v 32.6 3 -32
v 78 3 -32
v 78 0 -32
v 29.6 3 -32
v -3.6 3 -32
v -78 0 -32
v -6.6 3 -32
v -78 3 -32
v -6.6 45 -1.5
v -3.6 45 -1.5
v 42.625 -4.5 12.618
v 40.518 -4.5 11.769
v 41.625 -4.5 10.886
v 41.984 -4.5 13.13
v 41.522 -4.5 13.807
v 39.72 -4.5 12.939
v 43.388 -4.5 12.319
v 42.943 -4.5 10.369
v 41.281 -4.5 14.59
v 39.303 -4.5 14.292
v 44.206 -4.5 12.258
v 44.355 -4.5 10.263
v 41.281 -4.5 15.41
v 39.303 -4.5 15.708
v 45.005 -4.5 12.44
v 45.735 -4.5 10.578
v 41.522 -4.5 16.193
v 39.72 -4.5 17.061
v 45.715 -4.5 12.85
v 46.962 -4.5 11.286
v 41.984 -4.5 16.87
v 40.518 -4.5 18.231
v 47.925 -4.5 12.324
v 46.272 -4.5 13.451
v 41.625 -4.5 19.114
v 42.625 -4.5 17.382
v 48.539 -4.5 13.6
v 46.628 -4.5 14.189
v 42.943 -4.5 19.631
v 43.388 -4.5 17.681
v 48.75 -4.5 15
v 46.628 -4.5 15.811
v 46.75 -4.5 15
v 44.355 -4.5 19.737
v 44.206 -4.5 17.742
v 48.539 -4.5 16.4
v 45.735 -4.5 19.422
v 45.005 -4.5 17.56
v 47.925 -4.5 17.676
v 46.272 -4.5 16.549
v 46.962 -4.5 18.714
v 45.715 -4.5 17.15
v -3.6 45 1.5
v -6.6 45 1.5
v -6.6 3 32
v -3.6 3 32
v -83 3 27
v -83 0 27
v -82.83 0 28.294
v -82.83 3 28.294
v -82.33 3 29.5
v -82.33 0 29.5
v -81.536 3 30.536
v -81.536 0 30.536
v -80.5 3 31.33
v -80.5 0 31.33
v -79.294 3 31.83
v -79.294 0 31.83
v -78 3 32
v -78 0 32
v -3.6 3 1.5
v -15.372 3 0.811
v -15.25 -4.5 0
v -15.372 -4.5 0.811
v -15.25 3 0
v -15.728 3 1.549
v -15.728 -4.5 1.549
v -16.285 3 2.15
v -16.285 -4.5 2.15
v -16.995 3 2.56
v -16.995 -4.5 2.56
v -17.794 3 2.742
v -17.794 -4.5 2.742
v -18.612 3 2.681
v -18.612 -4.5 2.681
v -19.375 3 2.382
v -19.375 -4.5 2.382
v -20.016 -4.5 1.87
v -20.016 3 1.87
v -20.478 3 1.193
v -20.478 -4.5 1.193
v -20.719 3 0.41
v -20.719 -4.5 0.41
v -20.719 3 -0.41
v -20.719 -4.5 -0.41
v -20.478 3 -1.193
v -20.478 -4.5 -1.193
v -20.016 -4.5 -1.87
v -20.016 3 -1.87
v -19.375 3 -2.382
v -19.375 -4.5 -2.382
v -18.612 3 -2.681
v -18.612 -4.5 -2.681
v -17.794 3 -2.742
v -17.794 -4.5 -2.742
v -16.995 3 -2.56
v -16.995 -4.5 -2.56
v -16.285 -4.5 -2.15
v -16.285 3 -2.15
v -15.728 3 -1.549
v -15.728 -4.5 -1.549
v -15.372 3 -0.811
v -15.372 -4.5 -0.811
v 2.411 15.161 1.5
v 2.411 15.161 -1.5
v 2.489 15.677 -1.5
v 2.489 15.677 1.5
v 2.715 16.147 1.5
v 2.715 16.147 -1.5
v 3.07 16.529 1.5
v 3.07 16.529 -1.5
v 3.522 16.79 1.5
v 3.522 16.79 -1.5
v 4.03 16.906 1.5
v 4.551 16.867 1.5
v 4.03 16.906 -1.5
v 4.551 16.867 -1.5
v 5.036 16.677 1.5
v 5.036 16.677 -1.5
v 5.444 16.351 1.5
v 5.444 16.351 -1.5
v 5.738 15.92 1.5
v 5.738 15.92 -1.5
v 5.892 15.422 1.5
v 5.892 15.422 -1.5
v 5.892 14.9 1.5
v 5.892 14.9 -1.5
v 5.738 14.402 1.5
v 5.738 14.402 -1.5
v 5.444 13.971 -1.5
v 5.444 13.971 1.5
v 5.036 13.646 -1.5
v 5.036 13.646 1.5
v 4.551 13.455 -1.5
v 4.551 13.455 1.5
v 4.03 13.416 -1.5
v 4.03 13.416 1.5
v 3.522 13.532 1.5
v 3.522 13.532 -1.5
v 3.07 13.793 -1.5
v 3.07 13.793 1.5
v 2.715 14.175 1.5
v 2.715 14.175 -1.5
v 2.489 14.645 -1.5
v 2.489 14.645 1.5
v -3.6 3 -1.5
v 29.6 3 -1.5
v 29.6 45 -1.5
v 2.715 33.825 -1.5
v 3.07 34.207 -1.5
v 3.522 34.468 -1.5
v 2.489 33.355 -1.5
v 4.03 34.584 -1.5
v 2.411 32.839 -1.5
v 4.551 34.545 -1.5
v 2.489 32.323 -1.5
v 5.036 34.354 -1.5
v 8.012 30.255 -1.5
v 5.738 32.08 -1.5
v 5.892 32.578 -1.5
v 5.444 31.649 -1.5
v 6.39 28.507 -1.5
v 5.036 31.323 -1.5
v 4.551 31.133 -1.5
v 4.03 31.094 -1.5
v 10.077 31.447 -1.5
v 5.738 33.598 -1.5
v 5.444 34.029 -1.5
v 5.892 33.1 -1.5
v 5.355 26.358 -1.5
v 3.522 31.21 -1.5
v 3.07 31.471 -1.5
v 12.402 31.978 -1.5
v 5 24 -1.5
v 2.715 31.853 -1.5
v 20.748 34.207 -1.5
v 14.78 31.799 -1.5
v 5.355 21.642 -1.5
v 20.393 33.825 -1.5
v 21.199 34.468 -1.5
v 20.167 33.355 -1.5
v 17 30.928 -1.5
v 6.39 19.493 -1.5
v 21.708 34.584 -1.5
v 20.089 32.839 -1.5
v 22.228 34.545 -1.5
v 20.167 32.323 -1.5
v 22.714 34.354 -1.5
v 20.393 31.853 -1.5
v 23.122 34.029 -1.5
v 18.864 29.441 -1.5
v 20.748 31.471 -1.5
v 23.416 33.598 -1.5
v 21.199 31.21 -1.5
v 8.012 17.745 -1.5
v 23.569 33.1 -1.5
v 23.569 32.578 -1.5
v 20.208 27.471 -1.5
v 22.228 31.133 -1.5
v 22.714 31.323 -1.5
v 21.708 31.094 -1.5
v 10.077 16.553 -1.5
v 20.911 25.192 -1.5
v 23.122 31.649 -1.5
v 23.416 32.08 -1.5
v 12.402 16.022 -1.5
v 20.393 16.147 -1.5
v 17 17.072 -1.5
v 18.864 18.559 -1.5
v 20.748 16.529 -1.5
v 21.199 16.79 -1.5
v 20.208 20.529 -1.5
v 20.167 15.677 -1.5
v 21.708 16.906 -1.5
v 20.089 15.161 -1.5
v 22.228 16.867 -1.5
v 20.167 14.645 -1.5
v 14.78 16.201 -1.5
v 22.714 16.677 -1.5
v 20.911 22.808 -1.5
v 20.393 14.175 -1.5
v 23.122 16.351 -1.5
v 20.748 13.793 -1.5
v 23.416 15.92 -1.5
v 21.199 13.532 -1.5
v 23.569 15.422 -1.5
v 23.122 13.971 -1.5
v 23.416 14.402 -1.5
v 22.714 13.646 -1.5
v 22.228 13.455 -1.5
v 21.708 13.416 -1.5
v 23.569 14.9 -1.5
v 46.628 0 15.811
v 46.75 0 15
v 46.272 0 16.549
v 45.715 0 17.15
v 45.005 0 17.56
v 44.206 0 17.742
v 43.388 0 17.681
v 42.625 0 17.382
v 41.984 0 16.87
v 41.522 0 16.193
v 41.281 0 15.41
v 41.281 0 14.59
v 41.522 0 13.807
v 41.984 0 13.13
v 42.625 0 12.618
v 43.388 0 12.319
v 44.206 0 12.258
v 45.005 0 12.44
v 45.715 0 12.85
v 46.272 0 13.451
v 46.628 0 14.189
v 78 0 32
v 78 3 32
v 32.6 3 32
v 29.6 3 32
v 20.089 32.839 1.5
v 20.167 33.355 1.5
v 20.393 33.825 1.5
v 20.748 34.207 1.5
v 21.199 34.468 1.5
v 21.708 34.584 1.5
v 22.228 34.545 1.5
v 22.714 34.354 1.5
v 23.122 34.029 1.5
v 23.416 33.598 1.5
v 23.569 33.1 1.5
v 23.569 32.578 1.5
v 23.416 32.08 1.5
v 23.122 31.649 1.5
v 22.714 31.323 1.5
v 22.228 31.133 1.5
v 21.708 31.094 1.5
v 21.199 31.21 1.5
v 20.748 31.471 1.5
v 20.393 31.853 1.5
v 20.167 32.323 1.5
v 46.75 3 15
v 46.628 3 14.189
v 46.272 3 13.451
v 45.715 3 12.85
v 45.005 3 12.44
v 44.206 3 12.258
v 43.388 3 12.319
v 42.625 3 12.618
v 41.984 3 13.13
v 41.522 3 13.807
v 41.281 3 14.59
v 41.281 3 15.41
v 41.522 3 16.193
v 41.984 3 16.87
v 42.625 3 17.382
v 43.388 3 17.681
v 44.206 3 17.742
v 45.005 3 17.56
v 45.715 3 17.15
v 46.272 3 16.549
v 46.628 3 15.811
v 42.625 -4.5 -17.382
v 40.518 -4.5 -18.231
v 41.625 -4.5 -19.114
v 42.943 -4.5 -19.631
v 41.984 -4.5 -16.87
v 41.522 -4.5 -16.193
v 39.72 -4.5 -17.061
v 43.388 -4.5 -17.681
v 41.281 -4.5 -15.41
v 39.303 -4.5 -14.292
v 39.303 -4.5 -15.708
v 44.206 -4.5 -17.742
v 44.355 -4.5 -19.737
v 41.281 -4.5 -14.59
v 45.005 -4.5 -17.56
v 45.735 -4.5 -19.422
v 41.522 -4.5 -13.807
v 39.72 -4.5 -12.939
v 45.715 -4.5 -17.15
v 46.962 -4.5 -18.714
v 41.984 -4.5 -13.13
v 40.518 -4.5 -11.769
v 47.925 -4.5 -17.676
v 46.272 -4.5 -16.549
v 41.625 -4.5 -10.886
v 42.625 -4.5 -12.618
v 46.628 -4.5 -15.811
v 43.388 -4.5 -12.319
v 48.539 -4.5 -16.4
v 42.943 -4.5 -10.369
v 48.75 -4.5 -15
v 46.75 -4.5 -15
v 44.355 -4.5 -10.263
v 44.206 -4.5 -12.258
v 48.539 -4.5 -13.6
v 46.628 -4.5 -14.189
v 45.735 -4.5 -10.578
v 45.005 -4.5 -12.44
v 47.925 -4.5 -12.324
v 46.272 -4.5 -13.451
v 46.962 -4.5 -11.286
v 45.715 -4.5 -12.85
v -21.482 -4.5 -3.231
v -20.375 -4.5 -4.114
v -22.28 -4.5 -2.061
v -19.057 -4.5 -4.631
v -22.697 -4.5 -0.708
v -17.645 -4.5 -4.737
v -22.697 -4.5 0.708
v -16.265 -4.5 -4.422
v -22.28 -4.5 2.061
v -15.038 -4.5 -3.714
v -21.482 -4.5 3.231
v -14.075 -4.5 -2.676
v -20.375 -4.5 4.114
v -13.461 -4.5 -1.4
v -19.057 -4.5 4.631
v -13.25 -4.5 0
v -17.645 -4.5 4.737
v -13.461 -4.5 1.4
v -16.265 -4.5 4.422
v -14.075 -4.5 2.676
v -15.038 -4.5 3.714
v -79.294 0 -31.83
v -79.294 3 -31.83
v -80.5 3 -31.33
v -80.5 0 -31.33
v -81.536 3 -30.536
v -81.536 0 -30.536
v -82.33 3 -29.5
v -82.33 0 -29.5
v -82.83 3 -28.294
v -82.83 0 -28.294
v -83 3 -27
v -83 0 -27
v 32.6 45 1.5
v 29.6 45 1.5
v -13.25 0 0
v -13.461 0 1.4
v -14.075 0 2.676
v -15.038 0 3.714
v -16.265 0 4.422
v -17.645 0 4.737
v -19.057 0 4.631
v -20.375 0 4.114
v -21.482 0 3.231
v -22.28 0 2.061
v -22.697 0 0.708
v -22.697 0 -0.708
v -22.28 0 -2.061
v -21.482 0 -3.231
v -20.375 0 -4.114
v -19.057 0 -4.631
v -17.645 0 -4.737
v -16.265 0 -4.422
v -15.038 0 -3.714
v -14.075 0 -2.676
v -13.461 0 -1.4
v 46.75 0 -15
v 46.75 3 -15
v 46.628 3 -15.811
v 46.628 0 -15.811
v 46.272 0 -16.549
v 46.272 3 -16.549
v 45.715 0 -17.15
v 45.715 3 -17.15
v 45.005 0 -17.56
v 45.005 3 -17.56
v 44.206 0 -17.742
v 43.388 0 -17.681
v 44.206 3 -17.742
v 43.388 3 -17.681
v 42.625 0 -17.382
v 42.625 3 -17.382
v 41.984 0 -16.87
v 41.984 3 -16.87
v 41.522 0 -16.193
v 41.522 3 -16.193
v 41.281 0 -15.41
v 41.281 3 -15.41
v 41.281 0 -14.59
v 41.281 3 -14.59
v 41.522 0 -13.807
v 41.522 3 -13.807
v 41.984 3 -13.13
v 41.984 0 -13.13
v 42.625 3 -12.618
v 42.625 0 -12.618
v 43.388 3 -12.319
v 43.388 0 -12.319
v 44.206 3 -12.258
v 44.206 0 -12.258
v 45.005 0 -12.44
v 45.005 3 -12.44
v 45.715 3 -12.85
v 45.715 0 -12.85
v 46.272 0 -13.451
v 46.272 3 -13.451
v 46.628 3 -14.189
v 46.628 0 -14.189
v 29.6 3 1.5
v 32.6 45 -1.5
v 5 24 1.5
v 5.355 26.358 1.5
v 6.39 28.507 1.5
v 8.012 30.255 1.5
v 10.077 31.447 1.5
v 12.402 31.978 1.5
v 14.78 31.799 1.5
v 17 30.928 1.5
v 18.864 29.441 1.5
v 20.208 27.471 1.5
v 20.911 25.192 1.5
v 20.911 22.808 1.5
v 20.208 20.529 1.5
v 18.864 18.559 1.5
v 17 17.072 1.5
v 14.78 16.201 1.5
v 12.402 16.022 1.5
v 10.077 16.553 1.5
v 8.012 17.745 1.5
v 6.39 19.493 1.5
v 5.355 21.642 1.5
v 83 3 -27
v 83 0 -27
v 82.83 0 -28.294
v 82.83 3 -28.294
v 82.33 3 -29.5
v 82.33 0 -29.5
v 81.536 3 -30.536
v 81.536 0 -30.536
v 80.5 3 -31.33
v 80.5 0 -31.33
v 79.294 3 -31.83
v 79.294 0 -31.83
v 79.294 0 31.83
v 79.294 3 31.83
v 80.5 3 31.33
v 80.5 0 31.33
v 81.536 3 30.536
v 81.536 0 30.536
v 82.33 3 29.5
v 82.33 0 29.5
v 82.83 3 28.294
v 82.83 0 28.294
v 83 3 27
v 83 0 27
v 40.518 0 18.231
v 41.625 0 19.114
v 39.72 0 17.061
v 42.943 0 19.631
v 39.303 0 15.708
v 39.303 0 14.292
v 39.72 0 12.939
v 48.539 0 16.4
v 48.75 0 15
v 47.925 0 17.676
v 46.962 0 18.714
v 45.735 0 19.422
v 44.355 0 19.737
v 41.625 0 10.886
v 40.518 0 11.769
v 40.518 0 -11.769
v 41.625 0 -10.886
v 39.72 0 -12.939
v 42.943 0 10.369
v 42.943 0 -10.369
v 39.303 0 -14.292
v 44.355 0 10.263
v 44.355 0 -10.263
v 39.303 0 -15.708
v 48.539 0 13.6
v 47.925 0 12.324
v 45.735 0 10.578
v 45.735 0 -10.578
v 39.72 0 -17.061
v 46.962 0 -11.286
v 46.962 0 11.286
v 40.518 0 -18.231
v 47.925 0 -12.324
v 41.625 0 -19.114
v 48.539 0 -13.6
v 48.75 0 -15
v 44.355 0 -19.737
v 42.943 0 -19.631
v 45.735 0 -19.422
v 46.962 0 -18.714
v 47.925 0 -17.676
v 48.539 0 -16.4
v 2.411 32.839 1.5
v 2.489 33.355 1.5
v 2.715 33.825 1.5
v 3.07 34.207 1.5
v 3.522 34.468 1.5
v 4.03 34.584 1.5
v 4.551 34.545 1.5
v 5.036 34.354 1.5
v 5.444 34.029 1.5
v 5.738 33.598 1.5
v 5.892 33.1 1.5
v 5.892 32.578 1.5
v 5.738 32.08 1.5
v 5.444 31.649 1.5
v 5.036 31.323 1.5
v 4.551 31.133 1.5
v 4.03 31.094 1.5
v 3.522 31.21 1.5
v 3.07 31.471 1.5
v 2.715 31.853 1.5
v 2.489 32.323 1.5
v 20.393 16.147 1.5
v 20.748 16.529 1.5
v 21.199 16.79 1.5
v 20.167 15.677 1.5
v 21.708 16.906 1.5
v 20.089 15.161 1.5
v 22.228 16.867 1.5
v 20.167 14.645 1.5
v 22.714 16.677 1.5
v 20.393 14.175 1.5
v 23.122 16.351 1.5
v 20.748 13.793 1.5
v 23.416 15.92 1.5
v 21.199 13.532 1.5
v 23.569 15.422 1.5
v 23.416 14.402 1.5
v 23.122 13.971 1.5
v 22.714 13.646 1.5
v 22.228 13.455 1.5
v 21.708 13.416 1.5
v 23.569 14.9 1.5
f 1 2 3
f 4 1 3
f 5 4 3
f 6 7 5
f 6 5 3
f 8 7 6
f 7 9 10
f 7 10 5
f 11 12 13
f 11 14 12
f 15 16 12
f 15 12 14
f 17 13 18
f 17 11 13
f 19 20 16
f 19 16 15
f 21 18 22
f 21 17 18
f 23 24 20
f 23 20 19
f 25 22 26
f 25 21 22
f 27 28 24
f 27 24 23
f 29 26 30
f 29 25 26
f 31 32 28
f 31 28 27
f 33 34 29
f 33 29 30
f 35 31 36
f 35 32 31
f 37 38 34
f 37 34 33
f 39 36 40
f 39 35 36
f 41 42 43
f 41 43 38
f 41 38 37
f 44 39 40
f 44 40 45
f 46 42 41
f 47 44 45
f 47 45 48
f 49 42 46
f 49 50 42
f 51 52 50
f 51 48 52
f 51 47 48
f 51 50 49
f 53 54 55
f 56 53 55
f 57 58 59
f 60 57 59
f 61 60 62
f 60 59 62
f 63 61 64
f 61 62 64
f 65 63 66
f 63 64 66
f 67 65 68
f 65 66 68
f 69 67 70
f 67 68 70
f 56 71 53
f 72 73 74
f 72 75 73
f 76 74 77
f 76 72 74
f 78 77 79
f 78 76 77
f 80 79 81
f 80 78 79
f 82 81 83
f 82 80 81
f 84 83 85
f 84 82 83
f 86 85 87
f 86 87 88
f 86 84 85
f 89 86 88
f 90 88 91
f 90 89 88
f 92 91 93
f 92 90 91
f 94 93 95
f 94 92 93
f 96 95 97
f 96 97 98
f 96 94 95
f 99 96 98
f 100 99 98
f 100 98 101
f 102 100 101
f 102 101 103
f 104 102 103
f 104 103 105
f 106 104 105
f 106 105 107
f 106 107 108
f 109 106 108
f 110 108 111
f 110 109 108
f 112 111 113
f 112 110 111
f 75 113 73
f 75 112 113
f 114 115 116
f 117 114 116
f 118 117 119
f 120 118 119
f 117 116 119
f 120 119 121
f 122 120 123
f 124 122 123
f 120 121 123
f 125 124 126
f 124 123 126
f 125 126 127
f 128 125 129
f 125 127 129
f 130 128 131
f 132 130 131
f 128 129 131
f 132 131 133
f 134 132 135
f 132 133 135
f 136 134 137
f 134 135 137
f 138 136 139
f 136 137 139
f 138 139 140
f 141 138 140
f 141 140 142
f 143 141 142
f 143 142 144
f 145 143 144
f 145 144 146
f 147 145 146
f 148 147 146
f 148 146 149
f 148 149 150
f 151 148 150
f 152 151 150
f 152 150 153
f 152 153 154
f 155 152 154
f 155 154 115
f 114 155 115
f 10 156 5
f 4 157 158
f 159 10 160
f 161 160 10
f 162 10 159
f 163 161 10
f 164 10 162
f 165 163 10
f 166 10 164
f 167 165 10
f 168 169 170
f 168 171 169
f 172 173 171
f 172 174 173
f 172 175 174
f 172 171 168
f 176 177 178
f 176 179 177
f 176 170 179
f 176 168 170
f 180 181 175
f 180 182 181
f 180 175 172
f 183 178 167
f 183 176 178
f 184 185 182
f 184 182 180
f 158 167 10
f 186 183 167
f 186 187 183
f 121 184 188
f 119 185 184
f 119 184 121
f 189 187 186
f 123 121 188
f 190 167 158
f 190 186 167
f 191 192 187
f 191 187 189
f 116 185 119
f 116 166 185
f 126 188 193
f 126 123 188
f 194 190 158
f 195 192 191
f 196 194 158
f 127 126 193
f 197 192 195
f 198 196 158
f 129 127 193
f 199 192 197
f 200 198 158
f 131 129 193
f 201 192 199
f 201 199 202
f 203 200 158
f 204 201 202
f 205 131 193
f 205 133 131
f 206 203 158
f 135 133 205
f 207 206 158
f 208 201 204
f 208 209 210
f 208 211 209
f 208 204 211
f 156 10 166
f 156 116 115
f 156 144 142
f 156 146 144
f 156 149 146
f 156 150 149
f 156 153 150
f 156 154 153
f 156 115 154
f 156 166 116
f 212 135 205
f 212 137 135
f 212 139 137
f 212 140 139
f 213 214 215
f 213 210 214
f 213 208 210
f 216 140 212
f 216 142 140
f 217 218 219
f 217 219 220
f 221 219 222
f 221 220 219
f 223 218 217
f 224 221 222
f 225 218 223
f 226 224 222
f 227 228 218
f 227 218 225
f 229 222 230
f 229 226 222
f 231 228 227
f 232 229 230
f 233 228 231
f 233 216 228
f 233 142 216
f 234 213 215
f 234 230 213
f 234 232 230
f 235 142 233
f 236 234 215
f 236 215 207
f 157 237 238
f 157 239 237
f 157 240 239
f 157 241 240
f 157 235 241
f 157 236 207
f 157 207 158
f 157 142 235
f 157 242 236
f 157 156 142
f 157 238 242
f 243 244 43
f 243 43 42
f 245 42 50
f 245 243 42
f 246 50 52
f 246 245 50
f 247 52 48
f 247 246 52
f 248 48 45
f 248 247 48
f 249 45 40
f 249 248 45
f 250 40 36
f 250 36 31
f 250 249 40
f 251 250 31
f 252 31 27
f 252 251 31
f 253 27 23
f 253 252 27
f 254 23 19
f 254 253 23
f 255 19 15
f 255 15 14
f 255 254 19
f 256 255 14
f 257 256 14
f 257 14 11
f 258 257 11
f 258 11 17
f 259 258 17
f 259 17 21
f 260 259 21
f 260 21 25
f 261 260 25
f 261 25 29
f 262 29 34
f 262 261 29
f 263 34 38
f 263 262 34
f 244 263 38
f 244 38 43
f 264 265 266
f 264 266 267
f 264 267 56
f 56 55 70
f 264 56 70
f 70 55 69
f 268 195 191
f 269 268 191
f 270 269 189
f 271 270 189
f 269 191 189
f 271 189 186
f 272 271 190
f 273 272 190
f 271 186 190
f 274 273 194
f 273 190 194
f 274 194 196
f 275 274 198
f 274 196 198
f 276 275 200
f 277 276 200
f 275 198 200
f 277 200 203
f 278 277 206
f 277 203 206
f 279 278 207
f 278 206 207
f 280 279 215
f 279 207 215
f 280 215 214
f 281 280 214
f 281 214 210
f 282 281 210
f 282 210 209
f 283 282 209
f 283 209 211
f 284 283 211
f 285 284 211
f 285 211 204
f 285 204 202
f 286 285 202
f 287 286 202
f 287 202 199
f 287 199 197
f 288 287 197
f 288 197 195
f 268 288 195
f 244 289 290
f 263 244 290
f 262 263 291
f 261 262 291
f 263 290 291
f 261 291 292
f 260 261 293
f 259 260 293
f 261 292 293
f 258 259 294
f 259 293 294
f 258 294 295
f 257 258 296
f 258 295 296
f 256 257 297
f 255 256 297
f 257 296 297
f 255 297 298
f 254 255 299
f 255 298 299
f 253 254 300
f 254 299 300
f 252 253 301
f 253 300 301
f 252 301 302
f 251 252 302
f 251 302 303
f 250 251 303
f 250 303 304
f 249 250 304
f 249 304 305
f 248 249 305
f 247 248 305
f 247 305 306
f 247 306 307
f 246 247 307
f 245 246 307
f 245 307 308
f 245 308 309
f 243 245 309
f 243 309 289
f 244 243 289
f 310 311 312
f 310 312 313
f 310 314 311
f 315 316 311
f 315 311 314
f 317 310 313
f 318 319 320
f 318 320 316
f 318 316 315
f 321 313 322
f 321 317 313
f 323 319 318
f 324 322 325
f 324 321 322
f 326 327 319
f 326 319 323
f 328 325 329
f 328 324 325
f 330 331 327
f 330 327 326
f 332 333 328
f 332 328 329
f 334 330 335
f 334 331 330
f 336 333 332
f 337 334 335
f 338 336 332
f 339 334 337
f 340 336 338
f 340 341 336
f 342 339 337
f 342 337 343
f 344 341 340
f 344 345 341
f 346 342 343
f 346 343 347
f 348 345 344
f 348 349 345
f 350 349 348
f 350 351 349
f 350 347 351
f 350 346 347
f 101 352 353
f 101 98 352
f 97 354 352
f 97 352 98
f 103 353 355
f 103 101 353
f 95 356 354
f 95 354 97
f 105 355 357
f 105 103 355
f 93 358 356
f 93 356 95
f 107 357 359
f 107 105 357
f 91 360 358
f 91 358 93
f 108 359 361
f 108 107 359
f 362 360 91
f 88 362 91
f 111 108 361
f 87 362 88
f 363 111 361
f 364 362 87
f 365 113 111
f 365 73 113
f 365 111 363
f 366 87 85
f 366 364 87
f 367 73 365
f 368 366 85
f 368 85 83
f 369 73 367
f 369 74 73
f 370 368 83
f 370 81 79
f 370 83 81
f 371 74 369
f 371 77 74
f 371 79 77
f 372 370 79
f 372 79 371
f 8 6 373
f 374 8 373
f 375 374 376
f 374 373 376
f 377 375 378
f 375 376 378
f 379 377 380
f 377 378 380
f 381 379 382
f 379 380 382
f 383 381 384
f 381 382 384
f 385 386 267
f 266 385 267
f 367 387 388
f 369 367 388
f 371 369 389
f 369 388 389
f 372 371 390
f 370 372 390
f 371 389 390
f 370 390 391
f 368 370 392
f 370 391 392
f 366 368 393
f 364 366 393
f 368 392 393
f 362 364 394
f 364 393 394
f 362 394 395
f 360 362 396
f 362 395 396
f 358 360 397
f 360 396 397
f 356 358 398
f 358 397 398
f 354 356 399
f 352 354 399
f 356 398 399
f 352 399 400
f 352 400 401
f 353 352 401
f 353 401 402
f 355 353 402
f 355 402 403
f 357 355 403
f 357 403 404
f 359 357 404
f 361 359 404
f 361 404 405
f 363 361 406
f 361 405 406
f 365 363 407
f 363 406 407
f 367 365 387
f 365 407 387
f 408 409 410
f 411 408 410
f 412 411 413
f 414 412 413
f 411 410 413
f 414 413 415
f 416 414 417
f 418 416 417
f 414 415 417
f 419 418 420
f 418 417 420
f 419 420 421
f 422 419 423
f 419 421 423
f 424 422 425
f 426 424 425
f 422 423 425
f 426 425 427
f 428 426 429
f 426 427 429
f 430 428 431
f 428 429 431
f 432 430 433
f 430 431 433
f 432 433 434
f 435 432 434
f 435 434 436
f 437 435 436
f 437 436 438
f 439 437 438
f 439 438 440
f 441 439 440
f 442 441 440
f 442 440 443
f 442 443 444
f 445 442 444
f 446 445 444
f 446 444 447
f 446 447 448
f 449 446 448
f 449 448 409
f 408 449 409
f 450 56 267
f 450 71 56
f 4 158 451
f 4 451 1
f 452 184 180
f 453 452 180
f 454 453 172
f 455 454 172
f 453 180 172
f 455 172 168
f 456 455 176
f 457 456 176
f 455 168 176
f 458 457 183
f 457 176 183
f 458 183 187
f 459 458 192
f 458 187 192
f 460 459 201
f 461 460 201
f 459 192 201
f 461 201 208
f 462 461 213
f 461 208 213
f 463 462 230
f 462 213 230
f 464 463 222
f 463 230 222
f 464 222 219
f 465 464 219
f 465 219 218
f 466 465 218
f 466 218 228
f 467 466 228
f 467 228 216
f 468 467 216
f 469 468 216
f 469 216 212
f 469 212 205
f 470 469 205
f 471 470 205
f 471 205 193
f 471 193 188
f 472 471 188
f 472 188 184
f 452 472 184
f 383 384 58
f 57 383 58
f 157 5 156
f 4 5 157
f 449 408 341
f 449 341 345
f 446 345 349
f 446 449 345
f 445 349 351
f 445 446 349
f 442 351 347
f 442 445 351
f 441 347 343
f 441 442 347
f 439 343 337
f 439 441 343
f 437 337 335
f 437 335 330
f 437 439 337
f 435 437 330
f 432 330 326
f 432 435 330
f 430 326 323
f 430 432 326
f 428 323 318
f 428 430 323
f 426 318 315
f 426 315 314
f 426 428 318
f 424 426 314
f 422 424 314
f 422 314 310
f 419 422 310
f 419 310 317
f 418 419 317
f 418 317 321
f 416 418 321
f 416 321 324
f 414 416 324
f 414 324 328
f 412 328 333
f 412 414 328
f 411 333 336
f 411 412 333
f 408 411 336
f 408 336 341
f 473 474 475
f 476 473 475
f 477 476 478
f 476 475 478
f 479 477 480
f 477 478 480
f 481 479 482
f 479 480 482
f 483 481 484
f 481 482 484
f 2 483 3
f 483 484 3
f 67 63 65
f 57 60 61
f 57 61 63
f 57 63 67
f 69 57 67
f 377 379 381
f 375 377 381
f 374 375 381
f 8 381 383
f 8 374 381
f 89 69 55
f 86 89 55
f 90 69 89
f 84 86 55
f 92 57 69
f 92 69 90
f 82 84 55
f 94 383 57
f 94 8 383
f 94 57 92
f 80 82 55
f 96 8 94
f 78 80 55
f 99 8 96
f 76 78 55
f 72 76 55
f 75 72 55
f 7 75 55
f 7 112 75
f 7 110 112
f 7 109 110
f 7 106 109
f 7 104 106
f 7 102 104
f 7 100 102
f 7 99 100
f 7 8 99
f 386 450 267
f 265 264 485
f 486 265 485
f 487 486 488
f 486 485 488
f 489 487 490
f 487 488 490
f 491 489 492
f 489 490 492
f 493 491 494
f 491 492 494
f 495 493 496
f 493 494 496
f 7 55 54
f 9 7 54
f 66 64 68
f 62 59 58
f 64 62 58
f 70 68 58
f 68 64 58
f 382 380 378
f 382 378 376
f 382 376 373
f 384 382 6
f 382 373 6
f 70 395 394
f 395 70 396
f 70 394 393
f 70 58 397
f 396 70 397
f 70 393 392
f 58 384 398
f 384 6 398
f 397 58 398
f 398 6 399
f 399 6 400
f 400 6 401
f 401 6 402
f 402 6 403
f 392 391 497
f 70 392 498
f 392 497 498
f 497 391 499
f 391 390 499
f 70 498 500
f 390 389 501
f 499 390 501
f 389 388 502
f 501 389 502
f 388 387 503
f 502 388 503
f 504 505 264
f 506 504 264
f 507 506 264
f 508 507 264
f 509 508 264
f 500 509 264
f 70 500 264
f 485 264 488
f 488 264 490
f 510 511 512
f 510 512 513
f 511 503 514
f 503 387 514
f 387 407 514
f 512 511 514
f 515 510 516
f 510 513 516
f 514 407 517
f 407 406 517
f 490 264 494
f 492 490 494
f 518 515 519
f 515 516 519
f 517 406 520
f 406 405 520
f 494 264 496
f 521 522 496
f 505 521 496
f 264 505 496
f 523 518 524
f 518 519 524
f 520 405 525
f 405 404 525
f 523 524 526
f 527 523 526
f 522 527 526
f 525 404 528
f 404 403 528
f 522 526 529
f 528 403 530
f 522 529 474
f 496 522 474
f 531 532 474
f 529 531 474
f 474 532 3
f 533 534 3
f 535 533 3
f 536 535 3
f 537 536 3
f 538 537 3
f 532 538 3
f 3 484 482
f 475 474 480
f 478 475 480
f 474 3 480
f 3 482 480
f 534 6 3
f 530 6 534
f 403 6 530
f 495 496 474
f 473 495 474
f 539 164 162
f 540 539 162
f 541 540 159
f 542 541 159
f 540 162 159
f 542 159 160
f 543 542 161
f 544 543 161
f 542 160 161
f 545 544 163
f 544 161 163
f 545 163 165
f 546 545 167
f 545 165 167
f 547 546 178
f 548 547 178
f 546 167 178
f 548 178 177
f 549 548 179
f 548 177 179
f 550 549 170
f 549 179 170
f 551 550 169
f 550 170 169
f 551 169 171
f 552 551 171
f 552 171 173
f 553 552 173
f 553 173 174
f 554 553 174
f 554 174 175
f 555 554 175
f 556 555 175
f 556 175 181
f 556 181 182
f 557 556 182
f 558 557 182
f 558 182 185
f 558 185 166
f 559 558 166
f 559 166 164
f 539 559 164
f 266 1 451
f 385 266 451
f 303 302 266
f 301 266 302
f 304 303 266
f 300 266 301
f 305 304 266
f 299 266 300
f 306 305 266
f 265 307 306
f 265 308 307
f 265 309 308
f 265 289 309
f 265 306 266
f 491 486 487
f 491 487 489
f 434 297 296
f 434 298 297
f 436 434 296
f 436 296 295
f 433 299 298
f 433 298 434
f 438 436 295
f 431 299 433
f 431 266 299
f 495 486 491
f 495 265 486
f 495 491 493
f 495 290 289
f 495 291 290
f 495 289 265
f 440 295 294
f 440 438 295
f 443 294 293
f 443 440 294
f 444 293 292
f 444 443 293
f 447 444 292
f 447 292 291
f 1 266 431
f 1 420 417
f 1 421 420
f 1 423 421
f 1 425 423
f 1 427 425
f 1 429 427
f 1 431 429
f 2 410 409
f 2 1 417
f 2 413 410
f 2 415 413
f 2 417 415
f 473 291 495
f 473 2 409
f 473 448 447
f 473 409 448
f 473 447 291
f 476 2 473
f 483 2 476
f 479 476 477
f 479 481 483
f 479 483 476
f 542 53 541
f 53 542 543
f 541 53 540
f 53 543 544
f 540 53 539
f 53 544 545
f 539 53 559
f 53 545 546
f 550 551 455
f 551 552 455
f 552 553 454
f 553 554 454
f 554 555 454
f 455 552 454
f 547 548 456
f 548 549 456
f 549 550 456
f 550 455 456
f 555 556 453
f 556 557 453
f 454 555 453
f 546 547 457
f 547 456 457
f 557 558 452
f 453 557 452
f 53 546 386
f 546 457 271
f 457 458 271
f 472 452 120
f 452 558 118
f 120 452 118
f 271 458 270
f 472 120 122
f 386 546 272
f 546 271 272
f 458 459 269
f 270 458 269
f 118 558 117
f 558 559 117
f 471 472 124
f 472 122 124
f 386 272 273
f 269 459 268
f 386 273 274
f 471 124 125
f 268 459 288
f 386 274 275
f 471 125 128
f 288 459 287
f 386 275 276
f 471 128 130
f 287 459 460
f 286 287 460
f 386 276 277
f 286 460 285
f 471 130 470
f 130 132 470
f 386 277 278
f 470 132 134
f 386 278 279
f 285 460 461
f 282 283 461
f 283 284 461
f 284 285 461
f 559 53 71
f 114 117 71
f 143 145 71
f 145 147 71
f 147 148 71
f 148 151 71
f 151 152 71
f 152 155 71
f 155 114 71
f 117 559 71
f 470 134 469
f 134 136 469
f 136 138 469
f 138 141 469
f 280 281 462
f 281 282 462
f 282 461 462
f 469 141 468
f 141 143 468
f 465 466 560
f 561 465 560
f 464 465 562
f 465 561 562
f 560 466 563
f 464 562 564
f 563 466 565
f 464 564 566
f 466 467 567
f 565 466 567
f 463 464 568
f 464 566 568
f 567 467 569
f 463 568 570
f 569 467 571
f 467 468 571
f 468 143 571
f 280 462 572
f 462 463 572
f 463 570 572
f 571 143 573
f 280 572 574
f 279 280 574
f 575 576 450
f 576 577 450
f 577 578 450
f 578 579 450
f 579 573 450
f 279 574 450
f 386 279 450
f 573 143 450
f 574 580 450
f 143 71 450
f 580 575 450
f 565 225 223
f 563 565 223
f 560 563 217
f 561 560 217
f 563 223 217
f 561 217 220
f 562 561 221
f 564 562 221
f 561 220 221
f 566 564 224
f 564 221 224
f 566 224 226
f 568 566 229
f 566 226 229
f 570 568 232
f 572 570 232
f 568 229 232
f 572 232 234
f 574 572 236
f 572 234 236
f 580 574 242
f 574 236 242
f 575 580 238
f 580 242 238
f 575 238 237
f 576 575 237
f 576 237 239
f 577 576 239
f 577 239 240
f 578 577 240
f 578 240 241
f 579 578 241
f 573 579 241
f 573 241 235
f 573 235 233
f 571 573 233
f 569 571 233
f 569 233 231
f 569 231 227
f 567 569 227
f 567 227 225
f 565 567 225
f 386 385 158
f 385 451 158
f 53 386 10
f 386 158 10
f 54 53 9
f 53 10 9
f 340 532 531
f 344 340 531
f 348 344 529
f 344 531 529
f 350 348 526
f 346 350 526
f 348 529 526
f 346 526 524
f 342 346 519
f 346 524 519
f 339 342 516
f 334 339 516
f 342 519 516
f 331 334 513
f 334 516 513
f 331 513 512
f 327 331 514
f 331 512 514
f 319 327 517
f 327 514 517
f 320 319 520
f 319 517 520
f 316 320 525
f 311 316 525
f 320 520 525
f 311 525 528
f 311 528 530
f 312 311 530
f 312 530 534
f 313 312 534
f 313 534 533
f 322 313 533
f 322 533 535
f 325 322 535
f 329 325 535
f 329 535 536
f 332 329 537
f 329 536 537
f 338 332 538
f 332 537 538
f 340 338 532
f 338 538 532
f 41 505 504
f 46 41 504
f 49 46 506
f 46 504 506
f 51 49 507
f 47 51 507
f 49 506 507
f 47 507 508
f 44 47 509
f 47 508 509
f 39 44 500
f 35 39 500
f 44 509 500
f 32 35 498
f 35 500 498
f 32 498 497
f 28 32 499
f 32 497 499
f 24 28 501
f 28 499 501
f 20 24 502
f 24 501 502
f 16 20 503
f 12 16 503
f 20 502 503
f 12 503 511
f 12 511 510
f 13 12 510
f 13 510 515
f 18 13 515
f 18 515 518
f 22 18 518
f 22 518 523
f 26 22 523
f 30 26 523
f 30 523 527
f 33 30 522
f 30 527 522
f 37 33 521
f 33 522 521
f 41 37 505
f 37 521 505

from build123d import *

# Parameters (mm, degrees)
BOSS_EXTRUDE1_DEPTH      = 3
SKETCH2_R                = 2.75
CUT_EXTRUDE1_DEPTH       = 4
SKETCH3_W                = 39.2
SKETCH3_H                = 3
BOSS_EXTRUDE2_DEPTH      = 42
SKETCH6_R                = 8
SKETCH6_R_2              = 1.75
CUT_EXTRUDE2_DEPTH       = 31.5
CUT_EXTRUDE2_DEPTH_BACK  = 34.5
SKETCH7_W                = 3
SKETCH7_H                = 42
BOSS_EXTRUDE3_DEPTH      = 30.5
BOSS_EXTRUDE3_DEPTH_BACK = 33.5
CUT_EXTRUDE5_DEPTH       = 77.4
CUT_EXTRUDE5_DEPTH_BACK  = 90.6
SKETCH9_R                = 4.75
SKETCH9_R_2              = 2.75
BOSS_EXTRUDE4_DEPTH      = 4.5


with BuildPart() as part:
    # Sketch1 → Boss-Extrude1 (new body)
    with BuildSketch(Plane(origin=(0, 0, 0), x_dir=(1, 0, 0), z_dir=(0, 1, 0))):
        with BuildLine():
            Line((78, 32), (-78, 32))
            ThreePointArc((-78, 32), (-81.535533906, 30.535533906), (-83, 27))
            Line((-83, 27), (-83, -27))
            ThreePointArc((-83, -27), (-81.535533906, -30.535533906), (-78, -32))
            Line((-78, -32), (78, -32))
            ThreePointArc((78, -32), (81.535533906, -30.535533906), (83, -27))
            Line((83, -27), (83, 27))
            ThreePointArc((83, 27), (81.535533906, 30.535533906), (78, 32))
        make_face()
    extrude(amount=BOSS_EXTRUDE1_DEPTH)

    # Sketch2 → Cut-Extrude1 (cut, through all)
    with BuildSketch(Plane(origin=(0, 3, 0), x_dir=(1, 0, 0), z_dir=(0, 1, 0))):
        with Locations((44, -15)):
            Circle(SKETCH2_R)
        with Locations((44, 15)):
            Circle(SKETCH2_R)
        with Locations((-18, 0)):
            Circle(SKETCH2_R)
    extrude(amount=-CUT_EXTRUDE1_DEPTH, mode=Mode.SUBTRACT)

    # Sketch3 → Boss-Extrude2 (add)
    with BuildSketch(Plane(origin=(0, 3, 0), x_dir=(1, 0, 0), z_dir=(0, 1, 0))):
        with Locations((13, 0)):
            Rectangle(SKETCH3_W, SKETCH3_H)
    extrude(amount=BOSS_EXTRUDE2_DEPTH)

    # Sketch6 → Cut-Extrude2 (cut, two sides)
    with BuildSketch(Plane(origin=(0, 0, -1.5), x_dir=(-1, 0, 0), z_dir=(0, 0, -1))) as cut_extrude2_sk:
        with Locations((-13, 24)):
            Circle(SKETCH6_R)
        with Locations((-4.161165235, 15.161165235)):
            Circle(SKETCH6_R_2)
        with Locations((-21.838834765, 15.161165235)):
            Circle(SKETCH6_R_2)
        with Locations((-21.838834765, 32.838834765)):
            Circle(SKETCH6_R_2)
        with Locations((-4.161165235, 32.838834765)):
            Circle(SKETCH6_R_2)
    extrude(amount=CUT_EXTRUDE2_DEPTH, mode=Mode.SUBTRACT)
    extrude(cut_extrude2_sk.sketch, amount=-CUT_EXTRUDE2_DEPTH_BACK, mode=Mode.SUBTRACT)

    # Sketch7 → Boss-Extrude3 (add, two sides)
    with BuildSketch(Plane(origin=(0, 0, -1.5), x_dir=(-1, 0, 0), z_dir=(0, 0, -1))) as boss_extrude3_sk:
        with Locations((-31.1, 24)):
            Rectangle(SKETCH7_W, SKETCH7_H)
        with Locations((5.1, 24)):
            Rectangle(SKETCH7_W, SKETCH7_H)
    extrude(amount=BOSS_EXTRUDE3_DEPTH)
    extrude(boss_extrude3_sk.sketch, amount=-BOSS_EXTRUDE3_DEPTH_BACK)

    # Sketch8 → Cut-Extrude5 (cut, two sides)
    with BuildSketch(Plane.ZY.offset(6.6)) as cut_extrude5_sk:
        Polygon((-1.5, 45), (-32, 3), (-32, 45), align=None)
        Polygon((1.5, 45), (32, 3), (32, 45), align=None)
    extrude(amount=CUT_EXTRUDE5_DEPTH, mode=Mode.SUBTRACT)
    extrude(cut_extrude5_sk.sketch, amount=-CUT_EXTRUDE5_DEPTH_BACK, mode=Mode.SUBTRACT)

    # Sketch9 → Boss-Extrude4 (add)
    with BuildSketch(Plane.XZ):
        with Locations((-18, 0)):
            Circle(SKETCH9_R)
        with Locations((-18, 0)):
            Circle(SKETCH9_R_2, mode=Mode.SUBTRACT)
        with Locations((44, -15)):
            Circle(SKETCH9_R)
        with Locations((44, -15)):
            Circle(SKETCH9_R_2, mode=Mode.SUBTRACT)
        with Locations((44, 15)):
            Circle(SKETCH9_R)
        with Locations((44, 15)):
            Circle(SKETCH9_R_2, mode=Mode.SUBTRACT)
    extrude(amount=BOSS_EXTRUDE4_DEPTH)


solid = part.part
